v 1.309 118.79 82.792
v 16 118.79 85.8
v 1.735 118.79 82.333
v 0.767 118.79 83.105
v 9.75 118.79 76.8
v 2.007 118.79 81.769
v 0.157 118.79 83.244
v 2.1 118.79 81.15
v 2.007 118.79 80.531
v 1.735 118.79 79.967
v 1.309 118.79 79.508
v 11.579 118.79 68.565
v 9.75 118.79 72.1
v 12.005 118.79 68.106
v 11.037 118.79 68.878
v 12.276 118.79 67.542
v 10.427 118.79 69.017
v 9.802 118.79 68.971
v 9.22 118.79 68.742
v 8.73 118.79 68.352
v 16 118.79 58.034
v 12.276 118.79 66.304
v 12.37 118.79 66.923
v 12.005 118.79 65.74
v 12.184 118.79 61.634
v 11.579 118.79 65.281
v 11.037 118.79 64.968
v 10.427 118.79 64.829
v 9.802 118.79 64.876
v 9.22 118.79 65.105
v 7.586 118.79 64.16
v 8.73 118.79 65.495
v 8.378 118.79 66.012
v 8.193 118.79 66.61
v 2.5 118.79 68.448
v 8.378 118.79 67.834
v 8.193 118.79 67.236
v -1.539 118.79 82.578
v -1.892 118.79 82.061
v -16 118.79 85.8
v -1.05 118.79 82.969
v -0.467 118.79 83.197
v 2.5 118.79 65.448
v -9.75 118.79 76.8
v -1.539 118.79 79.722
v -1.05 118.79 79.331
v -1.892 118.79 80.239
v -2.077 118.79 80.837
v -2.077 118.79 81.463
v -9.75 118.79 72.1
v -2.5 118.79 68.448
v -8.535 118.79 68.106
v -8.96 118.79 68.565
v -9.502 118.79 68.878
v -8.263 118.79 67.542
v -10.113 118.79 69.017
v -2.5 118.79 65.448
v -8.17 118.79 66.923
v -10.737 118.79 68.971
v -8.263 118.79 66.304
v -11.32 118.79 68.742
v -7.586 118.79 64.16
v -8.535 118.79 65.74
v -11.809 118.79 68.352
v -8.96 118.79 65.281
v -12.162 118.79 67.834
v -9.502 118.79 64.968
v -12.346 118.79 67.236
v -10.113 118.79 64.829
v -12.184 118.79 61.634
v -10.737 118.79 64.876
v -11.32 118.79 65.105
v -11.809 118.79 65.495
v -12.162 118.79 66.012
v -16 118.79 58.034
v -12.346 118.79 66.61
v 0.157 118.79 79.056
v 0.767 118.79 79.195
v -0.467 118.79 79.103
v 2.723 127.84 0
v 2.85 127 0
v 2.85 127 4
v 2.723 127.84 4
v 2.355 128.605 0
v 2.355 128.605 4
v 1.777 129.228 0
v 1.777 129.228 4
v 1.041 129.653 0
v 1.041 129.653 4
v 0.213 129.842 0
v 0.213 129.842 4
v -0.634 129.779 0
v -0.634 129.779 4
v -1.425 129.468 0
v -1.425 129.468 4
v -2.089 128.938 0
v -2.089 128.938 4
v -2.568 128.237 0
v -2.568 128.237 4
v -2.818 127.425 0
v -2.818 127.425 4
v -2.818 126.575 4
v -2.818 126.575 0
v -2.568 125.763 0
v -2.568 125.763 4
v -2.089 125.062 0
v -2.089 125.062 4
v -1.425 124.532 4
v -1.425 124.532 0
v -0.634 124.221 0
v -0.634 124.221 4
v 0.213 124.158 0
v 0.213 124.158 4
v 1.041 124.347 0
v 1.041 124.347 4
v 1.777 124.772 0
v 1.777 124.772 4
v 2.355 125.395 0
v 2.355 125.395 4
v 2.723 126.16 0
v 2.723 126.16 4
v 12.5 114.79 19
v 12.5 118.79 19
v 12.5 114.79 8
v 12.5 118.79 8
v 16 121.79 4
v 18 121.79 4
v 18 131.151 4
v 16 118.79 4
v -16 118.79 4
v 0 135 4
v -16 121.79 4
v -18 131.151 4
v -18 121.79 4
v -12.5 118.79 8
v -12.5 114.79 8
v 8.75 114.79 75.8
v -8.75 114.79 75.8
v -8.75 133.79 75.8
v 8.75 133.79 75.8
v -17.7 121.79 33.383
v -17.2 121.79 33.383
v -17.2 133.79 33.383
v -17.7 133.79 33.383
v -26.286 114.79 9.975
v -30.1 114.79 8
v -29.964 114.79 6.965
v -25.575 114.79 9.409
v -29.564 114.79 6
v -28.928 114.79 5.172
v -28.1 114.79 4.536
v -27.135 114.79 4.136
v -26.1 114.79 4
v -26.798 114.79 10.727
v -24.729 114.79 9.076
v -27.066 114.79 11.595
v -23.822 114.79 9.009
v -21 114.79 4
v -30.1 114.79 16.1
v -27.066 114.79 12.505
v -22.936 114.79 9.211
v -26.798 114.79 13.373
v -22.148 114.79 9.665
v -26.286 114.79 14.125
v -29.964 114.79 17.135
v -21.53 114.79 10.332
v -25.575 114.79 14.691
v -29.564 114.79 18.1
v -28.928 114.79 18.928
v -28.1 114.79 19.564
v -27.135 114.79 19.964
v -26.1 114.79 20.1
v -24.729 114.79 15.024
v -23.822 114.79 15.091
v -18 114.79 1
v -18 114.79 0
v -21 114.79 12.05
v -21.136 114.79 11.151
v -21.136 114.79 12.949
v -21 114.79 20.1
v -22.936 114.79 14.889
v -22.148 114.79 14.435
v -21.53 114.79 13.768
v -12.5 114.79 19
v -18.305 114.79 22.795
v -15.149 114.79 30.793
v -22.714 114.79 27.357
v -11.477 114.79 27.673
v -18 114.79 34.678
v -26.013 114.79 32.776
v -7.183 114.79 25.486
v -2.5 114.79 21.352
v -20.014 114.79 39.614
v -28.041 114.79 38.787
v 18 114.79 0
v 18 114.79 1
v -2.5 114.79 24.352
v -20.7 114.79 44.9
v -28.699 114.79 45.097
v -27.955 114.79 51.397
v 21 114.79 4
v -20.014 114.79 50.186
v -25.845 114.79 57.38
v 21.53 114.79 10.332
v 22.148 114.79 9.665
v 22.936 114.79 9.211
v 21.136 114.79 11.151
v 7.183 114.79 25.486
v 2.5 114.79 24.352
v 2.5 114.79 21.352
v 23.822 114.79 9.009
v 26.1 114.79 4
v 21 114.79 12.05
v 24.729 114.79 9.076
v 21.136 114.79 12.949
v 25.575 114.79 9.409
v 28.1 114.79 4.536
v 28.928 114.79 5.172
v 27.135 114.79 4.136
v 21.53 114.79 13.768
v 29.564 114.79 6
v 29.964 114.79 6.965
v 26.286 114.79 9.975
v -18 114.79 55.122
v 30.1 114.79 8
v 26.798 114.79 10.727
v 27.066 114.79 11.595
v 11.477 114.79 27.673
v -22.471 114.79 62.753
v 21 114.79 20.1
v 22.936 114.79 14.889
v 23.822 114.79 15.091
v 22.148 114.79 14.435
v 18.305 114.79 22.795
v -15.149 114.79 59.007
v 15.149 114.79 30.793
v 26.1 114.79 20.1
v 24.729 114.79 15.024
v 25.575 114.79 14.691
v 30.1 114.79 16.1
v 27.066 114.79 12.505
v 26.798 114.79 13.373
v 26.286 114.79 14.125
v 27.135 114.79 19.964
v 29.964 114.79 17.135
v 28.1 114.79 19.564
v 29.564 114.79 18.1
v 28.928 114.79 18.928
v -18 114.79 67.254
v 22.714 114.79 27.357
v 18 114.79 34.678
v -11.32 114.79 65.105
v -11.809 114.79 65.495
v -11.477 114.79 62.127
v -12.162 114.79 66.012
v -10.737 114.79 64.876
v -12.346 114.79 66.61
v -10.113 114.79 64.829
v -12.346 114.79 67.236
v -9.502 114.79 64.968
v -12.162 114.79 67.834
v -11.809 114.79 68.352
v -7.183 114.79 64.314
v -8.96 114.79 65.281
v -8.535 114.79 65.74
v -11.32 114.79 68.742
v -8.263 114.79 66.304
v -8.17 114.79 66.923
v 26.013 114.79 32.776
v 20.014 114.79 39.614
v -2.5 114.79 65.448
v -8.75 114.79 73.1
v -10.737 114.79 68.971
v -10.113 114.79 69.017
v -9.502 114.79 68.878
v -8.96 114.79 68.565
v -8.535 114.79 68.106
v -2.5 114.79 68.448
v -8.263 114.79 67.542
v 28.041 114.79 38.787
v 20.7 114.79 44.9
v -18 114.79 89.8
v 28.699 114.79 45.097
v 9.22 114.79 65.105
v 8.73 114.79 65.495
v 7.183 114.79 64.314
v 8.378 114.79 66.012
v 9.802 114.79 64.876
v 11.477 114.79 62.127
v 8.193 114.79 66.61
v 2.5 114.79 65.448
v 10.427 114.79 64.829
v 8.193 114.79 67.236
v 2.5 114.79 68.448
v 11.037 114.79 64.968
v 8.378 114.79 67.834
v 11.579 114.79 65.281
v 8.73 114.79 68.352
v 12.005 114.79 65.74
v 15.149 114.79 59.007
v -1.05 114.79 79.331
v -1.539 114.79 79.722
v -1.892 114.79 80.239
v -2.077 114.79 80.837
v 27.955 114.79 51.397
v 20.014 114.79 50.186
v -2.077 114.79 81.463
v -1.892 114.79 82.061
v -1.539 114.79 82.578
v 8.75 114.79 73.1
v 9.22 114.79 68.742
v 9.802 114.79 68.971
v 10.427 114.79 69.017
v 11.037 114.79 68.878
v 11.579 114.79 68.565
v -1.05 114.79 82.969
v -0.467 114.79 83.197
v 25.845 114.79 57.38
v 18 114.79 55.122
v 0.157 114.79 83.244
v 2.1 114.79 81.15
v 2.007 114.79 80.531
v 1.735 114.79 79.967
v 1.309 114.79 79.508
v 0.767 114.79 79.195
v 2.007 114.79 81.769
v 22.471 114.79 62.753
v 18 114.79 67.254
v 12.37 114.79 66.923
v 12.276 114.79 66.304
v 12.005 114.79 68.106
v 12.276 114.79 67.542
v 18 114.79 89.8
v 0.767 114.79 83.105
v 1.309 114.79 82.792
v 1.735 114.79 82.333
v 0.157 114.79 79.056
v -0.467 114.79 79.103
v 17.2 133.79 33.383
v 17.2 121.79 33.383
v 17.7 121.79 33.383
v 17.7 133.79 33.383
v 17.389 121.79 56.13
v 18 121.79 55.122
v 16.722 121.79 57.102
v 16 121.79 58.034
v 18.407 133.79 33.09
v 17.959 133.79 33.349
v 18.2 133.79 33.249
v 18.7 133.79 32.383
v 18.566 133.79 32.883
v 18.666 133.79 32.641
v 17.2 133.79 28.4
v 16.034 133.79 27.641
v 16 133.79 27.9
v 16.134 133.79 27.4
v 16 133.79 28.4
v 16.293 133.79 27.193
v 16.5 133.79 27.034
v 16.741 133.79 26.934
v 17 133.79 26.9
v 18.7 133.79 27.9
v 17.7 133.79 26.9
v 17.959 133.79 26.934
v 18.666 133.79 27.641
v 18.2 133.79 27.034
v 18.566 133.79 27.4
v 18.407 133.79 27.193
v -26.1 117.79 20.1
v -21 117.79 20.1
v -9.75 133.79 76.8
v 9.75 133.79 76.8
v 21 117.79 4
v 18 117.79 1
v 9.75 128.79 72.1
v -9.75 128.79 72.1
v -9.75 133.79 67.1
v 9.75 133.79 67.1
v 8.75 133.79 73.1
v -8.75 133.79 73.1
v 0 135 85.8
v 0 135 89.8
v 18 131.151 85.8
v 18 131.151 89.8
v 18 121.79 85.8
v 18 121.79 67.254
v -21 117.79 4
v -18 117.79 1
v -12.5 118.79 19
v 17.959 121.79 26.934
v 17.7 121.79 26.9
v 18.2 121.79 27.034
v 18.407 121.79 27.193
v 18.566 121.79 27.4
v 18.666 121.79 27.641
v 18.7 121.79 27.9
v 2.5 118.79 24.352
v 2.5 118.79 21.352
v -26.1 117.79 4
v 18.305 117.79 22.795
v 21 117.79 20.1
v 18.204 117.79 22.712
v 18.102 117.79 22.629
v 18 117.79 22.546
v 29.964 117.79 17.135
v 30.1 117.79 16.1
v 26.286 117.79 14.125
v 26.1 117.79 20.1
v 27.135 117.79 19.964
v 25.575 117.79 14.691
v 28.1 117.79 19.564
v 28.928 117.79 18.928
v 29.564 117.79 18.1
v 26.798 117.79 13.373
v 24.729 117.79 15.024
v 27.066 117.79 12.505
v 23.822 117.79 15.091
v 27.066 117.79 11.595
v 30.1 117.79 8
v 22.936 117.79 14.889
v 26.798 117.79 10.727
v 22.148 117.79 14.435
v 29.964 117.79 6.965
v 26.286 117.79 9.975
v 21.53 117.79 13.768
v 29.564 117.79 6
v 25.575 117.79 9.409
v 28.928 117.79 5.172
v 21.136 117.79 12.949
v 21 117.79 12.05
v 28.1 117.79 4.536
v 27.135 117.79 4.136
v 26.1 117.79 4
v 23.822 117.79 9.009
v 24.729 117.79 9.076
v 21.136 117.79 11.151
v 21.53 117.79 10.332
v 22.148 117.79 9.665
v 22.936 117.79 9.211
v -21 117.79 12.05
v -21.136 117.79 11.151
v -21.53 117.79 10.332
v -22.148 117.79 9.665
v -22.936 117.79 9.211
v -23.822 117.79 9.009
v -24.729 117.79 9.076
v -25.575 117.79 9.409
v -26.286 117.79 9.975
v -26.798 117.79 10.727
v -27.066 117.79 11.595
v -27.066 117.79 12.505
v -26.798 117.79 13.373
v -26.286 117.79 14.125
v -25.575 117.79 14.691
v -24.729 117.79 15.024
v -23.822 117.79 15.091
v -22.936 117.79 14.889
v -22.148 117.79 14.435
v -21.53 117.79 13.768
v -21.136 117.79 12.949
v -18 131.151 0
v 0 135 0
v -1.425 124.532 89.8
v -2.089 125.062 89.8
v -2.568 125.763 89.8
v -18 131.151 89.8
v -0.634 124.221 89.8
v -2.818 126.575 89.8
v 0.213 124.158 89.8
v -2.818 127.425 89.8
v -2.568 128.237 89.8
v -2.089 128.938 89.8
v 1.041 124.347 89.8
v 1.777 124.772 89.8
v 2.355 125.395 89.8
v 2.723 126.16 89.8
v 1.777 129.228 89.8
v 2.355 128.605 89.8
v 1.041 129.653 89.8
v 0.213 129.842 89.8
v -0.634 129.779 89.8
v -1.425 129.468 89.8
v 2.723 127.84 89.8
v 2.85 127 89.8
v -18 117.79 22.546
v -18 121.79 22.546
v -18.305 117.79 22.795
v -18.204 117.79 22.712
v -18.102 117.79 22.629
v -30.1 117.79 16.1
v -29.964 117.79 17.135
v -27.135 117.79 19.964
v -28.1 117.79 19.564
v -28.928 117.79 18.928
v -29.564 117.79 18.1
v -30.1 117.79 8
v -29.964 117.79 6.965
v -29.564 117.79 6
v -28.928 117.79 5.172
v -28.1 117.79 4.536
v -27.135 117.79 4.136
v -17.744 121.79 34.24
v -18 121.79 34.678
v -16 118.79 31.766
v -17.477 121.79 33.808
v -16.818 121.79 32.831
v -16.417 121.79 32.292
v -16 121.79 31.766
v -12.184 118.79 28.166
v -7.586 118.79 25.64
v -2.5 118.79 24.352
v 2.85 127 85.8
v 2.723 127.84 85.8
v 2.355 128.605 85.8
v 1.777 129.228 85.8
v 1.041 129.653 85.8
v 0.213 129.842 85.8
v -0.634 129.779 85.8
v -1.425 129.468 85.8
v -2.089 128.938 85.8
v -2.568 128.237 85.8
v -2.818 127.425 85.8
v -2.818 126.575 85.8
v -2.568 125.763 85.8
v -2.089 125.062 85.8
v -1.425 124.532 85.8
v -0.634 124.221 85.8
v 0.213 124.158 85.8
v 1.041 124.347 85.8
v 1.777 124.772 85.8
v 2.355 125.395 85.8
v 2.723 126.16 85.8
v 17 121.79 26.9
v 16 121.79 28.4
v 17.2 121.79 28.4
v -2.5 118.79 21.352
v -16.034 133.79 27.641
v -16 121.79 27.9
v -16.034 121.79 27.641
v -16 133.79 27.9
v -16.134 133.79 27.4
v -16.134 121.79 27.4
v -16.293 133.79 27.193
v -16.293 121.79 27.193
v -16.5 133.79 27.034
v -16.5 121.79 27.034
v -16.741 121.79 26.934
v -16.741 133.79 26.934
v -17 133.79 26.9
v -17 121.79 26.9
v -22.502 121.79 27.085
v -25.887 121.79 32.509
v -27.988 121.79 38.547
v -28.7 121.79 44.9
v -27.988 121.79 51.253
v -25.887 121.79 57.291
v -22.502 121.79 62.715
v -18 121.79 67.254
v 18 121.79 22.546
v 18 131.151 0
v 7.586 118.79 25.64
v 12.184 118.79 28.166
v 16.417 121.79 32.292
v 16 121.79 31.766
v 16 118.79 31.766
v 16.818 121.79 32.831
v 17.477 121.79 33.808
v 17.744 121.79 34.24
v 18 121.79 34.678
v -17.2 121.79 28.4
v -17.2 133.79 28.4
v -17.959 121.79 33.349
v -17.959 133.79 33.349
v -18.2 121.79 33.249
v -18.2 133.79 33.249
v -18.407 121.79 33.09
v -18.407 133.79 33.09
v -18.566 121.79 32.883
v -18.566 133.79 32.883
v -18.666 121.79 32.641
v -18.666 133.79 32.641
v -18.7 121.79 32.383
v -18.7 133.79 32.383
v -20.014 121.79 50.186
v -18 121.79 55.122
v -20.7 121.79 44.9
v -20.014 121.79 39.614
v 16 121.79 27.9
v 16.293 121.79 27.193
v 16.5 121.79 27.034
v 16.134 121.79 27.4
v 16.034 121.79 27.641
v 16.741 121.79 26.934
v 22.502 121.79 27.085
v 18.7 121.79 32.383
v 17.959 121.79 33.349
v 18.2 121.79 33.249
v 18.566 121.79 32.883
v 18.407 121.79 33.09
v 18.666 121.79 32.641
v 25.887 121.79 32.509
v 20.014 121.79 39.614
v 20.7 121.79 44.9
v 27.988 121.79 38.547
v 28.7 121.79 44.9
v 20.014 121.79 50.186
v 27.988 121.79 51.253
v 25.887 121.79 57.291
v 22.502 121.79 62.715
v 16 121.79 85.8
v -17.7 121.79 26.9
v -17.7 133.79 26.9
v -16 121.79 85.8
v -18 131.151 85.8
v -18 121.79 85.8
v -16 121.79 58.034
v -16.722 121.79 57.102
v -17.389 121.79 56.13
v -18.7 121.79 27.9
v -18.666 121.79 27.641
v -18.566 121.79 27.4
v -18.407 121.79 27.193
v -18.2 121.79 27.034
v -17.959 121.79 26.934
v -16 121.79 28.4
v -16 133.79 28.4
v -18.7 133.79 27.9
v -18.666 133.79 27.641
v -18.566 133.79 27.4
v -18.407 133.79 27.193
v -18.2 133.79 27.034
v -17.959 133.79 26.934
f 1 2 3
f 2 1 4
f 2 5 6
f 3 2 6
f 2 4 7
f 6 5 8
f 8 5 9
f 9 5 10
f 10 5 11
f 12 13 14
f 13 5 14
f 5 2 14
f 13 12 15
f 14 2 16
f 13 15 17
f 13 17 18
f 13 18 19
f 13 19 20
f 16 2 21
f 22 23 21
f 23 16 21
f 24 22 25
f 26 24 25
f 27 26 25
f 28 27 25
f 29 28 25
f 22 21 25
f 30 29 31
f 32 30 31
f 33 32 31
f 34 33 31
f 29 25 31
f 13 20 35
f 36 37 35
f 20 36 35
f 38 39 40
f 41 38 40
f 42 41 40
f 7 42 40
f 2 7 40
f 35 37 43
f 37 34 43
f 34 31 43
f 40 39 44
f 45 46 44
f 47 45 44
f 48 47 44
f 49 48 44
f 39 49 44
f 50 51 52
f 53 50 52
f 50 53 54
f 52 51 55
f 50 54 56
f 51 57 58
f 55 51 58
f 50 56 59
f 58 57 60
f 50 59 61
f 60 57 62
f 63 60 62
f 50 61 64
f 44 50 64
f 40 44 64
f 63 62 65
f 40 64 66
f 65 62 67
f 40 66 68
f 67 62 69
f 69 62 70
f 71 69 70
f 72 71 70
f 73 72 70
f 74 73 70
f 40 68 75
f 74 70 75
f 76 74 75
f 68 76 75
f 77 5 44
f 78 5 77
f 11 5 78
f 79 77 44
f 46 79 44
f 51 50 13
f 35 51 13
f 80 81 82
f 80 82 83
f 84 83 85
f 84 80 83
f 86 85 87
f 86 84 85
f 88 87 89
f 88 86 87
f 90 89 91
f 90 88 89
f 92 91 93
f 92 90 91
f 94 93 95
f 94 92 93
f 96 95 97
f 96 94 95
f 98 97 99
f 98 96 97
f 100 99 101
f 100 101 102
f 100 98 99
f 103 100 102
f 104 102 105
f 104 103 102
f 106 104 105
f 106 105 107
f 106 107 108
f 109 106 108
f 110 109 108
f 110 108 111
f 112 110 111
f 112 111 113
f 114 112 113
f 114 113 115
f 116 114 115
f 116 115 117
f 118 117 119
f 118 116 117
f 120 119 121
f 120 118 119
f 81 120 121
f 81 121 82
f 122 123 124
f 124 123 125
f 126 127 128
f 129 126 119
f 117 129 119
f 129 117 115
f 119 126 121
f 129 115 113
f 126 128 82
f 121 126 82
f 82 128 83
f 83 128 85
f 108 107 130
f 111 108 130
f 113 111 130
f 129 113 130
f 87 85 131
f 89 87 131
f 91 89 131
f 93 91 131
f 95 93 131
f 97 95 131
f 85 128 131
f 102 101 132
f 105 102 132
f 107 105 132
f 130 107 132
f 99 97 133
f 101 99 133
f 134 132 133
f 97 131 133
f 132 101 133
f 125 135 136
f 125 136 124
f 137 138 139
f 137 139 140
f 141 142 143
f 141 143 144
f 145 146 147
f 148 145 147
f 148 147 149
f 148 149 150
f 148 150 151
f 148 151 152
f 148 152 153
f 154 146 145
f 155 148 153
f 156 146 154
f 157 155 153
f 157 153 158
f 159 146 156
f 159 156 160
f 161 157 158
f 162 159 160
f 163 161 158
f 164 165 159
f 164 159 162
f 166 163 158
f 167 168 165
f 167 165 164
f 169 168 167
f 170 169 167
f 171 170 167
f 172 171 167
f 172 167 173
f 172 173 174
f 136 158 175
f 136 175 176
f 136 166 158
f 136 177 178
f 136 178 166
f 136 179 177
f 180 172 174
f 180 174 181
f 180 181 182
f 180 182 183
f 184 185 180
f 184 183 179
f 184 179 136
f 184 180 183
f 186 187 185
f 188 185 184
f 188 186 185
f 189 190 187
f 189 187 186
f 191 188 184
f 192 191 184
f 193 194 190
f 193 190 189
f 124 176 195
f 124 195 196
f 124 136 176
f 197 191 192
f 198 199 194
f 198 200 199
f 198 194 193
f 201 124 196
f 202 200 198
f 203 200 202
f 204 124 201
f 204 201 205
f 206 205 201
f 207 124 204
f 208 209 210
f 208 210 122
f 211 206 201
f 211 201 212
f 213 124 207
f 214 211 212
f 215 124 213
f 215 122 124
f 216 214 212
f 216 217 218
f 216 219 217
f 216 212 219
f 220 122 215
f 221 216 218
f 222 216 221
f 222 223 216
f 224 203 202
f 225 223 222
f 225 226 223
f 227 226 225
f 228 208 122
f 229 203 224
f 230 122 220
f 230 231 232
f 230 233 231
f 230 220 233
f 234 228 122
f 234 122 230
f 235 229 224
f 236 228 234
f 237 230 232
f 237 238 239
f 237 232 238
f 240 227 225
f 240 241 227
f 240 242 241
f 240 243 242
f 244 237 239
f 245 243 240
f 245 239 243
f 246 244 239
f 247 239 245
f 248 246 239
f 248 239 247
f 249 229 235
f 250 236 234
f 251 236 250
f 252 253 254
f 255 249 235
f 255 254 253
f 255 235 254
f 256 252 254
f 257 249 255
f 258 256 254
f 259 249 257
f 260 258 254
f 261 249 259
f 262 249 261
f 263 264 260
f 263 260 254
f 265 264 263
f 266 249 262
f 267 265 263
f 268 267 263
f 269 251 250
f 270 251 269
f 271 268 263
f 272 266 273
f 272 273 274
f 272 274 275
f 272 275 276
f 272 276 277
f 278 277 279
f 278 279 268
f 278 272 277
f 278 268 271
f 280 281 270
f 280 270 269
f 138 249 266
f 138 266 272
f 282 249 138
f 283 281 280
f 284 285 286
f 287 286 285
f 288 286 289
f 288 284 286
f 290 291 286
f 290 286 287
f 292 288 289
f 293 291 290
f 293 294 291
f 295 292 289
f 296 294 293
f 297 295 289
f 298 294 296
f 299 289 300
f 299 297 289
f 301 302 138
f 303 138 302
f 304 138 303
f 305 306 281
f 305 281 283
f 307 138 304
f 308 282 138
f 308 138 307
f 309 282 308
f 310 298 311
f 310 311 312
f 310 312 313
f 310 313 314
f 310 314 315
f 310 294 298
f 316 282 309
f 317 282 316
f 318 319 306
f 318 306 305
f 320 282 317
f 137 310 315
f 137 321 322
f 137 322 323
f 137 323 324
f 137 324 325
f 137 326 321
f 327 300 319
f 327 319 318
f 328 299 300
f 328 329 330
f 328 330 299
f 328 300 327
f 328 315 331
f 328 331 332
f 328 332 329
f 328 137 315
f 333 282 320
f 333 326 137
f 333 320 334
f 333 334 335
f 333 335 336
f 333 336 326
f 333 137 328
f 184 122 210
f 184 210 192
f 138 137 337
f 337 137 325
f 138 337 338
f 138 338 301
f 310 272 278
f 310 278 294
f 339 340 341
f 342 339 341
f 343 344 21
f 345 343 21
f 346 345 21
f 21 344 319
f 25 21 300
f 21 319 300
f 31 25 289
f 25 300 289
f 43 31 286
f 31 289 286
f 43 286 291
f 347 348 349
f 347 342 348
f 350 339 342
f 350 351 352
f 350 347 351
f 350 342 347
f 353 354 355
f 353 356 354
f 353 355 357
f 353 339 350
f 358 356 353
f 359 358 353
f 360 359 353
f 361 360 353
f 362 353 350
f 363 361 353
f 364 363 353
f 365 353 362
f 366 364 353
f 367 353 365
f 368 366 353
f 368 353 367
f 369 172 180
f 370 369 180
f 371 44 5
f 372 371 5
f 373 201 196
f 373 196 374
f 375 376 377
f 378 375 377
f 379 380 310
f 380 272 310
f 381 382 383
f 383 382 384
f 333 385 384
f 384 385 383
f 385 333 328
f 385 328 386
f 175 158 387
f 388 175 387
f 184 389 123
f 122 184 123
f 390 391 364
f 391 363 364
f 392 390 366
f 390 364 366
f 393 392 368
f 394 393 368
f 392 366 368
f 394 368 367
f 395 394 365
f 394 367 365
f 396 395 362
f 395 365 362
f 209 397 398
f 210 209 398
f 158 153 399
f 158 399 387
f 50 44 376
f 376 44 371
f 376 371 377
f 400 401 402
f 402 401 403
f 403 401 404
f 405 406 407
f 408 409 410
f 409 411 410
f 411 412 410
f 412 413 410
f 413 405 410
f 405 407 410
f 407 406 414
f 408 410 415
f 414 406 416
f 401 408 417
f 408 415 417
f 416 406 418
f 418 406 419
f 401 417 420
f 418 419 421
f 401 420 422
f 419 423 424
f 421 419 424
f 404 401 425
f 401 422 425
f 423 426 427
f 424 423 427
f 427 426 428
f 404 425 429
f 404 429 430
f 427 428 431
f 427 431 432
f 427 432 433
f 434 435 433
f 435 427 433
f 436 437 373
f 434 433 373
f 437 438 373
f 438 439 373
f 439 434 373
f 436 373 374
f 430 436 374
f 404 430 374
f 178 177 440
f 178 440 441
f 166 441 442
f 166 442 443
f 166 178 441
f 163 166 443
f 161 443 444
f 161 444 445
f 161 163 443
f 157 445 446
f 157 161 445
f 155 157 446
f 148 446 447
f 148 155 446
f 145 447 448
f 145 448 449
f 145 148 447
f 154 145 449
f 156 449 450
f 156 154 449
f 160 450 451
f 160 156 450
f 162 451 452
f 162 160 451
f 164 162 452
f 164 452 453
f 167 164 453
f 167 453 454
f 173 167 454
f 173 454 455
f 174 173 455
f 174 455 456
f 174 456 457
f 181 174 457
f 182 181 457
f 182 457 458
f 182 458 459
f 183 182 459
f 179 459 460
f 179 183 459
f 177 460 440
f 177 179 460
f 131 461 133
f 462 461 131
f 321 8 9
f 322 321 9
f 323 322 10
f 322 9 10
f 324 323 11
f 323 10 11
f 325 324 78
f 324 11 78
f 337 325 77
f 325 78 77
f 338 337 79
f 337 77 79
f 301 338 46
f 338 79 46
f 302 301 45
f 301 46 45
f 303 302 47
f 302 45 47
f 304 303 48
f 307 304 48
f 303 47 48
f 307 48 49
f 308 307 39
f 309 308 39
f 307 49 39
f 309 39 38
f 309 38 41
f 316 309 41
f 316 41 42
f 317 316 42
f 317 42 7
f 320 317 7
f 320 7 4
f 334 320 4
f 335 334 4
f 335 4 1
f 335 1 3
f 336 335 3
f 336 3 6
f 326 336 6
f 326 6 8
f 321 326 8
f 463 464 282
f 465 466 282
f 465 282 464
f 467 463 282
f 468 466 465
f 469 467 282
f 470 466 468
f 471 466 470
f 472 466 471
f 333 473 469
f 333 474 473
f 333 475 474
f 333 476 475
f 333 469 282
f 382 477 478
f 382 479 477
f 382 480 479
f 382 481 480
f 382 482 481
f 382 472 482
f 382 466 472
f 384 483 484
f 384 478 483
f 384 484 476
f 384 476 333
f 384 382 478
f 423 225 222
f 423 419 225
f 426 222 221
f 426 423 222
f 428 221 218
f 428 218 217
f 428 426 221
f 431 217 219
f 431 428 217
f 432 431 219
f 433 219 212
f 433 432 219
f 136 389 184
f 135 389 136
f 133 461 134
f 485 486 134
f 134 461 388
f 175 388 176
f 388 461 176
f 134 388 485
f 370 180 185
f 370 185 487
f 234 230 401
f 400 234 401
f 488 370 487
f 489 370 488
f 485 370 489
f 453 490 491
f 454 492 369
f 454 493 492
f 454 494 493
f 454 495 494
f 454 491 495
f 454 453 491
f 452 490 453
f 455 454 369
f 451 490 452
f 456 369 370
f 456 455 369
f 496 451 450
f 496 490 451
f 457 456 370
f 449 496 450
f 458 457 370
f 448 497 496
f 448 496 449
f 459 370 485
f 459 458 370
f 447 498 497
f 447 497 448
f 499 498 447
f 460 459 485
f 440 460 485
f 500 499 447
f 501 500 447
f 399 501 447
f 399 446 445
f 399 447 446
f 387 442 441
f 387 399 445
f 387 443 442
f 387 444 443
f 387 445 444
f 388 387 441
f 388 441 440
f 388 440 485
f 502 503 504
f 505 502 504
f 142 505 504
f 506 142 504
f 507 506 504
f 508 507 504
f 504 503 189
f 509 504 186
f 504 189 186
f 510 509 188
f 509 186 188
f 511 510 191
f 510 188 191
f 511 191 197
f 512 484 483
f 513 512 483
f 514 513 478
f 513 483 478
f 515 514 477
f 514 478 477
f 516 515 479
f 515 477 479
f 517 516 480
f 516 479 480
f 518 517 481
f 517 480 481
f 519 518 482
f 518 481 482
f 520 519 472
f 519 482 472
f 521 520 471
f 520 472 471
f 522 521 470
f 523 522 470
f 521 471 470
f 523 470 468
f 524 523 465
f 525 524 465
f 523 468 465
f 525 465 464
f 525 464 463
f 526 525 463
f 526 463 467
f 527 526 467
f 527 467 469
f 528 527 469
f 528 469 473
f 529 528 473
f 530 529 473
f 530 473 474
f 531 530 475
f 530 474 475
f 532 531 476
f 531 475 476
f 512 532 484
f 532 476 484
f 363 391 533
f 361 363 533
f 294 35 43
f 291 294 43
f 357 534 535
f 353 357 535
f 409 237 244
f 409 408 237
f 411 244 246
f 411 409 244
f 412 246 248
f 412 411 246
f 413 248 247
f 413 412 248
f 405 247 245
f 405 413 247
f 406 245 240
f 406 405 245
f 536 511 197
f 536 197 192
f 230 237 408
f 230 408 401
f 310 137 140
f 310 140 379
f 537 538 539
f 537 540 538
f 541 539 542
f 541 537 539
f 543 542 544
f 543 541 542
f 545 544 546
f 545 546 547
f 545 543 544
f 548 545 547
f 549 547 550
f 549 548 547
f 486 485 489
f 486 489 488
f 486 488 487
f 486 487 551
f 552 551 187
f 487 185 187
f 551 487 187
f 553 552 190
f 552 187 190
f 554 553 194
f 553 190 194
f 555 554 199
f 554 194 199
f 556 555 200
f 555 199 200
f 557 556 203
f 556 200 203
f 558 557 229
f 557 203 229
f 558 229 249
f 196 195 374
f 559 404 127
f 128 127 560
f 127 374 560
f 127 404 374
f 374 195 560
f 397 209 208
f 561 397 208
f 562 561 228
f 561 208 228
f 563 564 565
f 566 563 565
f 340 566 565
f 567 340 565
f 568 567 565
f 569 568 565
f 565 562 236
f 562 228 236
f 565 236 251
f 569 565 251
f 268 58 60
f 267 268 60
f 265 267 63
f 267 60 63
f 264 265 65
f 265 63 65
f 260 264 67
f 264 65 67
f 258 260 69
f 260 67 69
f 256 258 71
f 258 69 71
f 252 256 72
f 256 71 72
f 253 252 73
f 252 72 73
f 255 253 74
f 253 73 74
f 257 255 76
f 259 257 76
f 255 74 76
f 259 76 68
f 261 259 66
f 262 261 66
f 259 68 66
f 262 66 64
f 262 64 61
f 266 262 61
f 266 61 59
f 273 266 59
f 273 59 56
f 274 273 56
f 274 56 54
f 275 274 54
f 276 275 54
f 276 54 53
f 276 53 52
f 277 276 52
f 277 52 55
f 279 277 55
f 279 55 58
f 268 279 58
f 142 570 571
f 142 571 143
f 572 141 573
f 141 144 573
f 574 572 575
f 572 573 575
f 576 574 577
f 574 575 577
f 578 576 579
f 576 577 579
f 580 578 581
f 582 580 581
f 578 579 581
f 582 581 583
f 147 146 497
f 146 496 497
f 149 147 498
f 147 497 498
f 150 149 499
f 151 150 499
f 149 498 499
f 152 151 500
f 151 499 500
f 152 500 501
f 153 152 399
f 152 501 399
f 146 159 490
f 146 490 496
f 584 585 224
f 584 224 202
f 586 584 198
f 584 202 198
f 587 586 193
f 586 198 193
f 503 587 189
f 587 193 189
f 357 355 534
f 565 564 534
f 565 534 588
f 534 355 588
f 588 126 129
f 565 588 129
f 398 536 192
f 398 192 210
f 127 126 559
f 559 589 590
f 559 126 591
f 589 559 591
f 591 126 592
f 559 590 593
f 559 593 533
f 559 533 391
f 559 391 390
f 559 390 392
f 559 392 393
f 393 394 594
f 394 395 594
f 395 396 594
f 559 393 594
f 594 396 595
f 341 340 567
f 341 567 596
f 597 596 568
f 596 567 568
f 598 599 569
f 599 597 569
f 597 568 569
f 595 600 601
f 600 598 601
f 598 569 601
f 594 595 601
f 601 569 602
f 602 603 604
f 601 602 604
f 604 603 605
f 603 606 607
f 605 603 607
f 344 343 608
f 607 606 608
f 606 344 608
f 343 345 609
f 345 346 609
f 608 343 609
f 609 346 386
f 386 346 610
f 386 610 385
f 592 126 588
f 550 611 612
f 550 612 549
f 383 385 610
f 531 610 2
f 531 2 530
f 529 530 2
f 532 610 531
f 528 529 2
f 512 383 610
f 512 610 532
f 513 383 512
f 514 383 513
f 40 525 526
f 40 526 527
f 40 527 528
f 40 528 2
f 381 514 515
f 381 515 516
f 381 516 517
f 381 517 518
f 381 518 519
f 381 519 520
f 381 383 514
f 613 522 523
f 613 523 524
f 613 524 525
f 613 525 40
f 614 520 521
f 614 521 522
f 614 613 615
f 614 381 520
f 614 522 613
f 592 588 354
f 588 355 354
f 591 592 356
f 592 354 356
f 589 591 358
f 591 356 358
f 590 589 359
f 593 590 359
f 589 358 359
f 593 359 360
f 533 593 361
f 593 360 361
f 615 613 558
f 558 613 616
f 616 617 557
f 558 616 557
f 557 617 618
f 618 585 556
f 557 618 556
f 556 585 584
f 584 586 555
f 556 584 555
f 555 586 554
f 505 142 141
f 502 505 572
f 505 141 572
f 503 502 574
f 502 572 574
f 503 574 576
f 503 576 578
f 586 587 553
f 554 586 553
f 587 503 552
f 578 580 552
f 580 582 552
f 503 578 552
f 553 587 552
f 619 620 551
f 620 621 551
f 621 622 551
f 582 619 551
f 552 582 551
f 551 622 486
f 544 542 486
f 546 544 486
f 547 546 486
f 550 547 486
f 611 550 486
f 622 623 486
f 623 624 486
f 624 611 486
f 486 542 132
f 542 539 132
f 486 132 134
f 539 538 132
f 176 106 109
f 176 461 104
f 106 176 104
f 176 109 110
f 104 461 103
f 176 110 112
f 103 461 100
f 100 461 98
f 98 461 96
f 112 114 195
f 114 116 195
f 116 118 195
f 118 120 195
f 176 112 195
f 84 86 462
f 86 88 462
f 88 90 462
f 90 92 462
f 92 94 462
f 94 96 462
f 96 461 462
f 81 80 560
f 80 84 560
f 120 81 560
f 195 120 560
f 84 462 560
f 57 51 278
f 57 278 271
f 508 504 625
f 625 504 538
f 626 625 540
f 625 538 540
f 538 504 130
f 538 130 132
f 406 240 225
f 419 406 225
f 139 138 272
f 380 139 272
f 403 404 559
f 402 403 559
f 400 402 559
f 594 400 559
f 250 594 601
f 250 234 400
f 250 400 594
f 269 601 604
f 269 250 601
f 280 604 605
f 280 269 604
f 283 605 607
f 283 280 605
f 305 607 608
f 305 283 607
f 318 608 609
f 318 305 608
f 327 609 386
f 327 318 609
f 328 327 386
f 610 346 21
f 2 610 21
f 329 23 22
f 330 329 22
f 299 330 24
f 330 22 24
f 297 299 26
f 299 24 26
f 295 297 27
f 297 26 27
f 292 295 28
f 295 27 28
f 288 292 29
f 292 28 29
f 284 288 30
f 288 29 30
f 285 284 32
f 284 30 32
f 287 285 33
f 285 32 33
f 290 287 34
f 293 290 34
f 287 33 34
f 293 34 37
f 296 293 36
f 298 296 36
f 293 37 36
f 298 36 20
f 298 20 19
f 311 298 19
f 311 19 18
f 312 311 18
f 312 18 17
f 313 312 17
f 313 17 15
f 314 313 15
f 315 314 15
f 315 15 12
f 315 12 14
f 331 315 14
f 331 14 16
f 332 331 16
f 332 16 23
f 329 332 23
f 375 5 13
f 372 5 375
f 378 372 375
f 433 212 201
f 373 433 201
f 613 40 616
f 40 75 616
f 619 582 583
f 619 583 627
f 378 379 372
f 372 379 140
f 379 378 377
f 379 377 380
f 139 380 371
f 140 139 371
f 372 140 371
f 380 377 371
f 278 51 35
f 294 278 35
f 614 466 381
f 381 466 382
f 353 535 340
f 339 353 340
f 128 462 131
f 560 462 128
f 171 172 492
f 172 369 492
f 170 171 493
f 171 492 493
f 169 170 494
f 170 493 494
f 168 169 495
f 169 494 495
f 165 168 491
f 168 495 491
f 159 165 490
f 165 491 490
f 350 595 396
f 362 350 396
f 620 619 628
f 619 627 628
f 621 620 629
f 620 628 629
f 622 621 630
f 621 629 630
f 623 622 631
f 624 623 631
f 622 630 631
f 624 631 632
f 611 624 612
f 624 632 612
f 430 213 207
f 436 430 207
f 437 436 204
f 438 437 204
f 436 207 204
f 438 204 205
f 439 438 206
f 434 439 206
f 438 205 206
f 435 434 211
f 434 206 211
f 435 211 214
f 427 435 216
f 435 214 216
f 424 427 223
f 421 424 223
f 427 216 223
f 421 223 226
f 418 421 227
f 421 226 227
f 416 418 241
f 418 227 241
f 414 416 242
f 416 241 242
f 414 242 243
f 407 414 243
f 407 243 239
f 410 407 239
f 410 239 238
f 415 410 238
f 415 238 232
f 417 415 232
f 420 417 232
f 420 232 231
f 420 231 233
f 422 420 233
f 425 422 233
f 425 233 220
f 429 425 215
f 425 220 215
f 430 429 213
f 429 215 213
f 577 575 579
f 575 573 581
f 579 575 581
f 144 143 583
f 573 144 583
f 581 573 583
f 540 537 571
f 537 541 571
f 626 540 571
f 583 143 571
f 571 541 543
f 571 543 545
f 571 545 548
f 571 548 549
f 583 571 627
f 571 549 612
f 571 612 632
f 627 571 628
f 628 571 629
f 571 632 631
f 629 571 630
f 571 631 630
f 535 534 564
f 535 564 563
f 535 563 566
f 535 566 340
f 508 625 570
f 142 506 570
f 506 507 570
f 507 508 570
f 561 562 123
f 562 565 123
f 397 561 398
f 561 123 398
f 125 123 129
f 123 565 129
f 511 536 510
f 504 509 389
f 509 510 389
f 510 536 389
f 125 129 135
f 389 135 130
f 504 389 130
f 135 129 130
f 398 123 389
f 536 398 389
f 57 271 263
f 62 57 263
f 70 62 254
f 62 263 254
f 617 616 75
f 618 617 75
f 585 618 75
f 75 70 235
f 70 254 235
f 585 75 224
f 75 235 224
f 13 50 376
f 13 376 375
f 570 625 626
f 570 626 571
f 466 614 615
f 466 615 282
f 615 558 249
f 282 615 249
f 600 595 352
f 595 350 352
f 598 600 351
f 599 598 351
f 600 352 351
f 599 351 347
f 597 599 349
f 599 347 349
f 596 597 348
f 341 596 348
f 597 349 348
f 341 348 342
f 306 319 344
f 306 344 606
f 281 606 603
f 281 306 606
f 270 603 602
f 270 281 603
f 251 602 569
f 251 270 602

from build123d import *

# Parameters (mm, degrees)
BOSS_EXTRUDE1_DEPTH  = 89.8
SKETCH5_R            = 2.85
BOSS_EXTRUDE2_DEPTH  = 4
SKETCH6_W            = 25
SKETCH6_H            = 11
CUT_EXTRUDE4_DEPTH   = 5
SKETCH8_W            = 19.5
SKETCH8_H            = 4.7
SKETCH8_W_2          = 17.5
SKETCH8_H_2          = 2.7
BOSS_EXTRUDE3_DEPTH  = 15
BOSS_EXTRUDE4_DEPTH  = 19.5
SKETCH13_W           = 17.5
SKETCH13_H           = 2.7
CUT_EXTRUDE5_DEPTH   = 5
SKETCH14_W           = 12.1
SKETCH14_H           = 16.1
SKETCH14_R           = 3.05
BOSS_EXTRUDE7_DEPTH  = 3
CHAMFER1_SIZE        = 3
SKETCH17_R           = 2.1
CUT_EXTRUDE6_DEPTH   = 5
BOSS_EXTRUDE8_DEPTH  = 7
CUT_EXTRUDE7_REACH   = 22.21
SKETCH20_R           = 20.7
FILLET1_R            = 4
SKETCH21_R           = 2.1
CUT_EXTRUDE8_DEPTH   = 5
SKETCH22_W           = 5
SKETCH22_H           = 3
CUT_EXTRUDE9_DEPTH   = 5
BOSS_EXTRUDE9_DEPTH  = 12
FILLET2_R            = 1
FILLET2_OF_MIRROR3_R = 1


with BuildPart() as part:
    # Sketch1 → Boss-Extrude1 (new body)
    with BuildSketch(Plane.XY):
        Polygon((-18, 114.78957189), (0, 114.78957189), (18, 114.78957189), (18, 121.78957189), (16, 121.78957189), (16, 118.78957189), (-16, 118.78957189), (-16, 121.78957189), (-18, 121.78957189), align=None)
    extrude(amount=BOSS_EXTRUDE1_DEPTH)

    # Sketch5 → Boss-Extrude2 (add)
    with BuildSketch(Plane.XY):
        Polygon((-18, 114.78957189), (-18, 131.151236874), (0, 135), (18, 131.151236874), (18, 114.78957189), align=None)
        with Locations((0, 127)):
            Circle(SKETCH5_R, mode=Mode.SUBTRACT)
    boss_extrude2 = extrude(amount=BOSS_EXTRUDE2_DEPTH)

    # Mirror1: Boss-Extrude2 across plane
    add(boss_extrude2.mirror(Plane(origin=(0, 0, 44.9), x_dir=(1, 0, 0), z_dir=(0, 0, -1))))

    # Sketch6 → Cut-Extrude4 (cut, through all)
    with BuildSketch(Plane(origin=(0, 118.78957189, 0), x_dir=(1, 0, 0), z_dir=(0, 1, 0))):
        with Locations((0, -13.5)):
            Rectangle(SKETCH6_W, SKETCH6_H)
    extrude(amount=-CUT_EXTRUDE4_DEPTH, mode=Mode.SUBTRACT)

    # Sketch8 → Boss-Extrude3 (add)
    with BuildSketch(Plane(origin=(0, 118.78957189, 0), x_dir=(1, 0, 0), z_dir=(0, 1, 0))):
        with Locations((0, -74.45)):
            Rectangle(SKETCH8_W, SKETCH8_H)
        with Locations((0, -74.45)):
            Rectangle(SKETCH8_W_2, SKETCH8_H_2, mode=Mode.SUBTRACT)
    extrude(amount=BOSS_EXTRUDE3_DEPTH)

    # Sketch9 → Boss-Extrude4 (add)
    with BuildSketch(Plane.ZY.offset(9.75)):
        Polygon((72.1, 128.78957189), (67.1, 133.78957189), (72.1, 133.78957189), align=None)
    extrude(amount=-BOSS_EXTRUDE4_DEPTH)

    # Sketch13 → Cut-Extrude5 (cut, through all)
    with BuildSketch(Plane(origin=(0, 118.78957189, 0), x_dir=(1, 0, 0), z_dir=(0, 1, 0))):
        with Locations((0, -74.45)):
            Rectangle(SKETCH13_W, SKETCH13_H)
    extrude(amount=-CUT_EXTRUDE5_DEPTH, mode=Mode.SUBTRACT)

    # Sketch14 → Boss-Extrude7 (add)
    with BuildSketch(Plane(origin=(0, 114.78957189, 0), x_dir=(1, 0, 0), z_dir=(0, 1, 0))):
        with Locations((-24.05, -12.05)):
            Rectangle(SKETCH14_W, SKETCH14_H)
        with Locations((-24.05, -12.05)):
            Circle(SKETCH14_R, mode=Mode.SUBTRACT)
    boss_extrude7 = extrude(amount=BOSS_EXTRUDE7_DEPTH)

    # Mirror2: Boss-Extrude7 across plane
    add(boss_extrude7.mirror(Plane(origin=(0, 0, 0), x_dir=(0, 0, 1), z_dir=(1, 0, 0))))

    # Chamfer1
    chamfer1_edges = [part.edges().sort_by_distance(p)[0] for p in [
        (-18, 116.28957189, 20.1),
        (-18, 116.28957189, 4),
        (18, 116.28957189, 4),
        (18, 116.28957189, 20.1),
    ]]
    chamfer(chamfer1_edges, length=CHAMFER1_SIZE)

    # Sketch17 → Cut-Extrude6 (cut, through all)
    with BuildSketch(Plane(origin=(0, 118.78957189, 0), x_dir=(1, 0, 0), z_dir=(0, 1, 0))):
        with Locations((0, -81.15)):
            Circle(SKETCH17_R)
    extrude(amount=-CUT_EXTRUDE6_DEPTH, mode=Mode.SUBTRACT)

    # Sketch19 → Boss-Extrude8 (add)
    with BuildSketch(Plane.XZ.offset(-114.78957189)):
        with BuildLine():
            Line((18, 67.25374689), (18, 55.122035022))
            ThreePointArc((18, 55.122035022), (20.7, 44.9), (18, 34.677964978))
            Line((18, 34.677964978), (18, 22.54625311))
            ThreePointArc((18, 22.54625311), (28.7, 44.9), (18, 67.25374689))
        make_face()
        with BuildLine():
            Line((-16, 68.726246032), (-16, 58.033544838))
            ThreePointArc((-16, 58.033544838), (-20.624518846, 46.666132031), (-18, 34.677964978))
            Line((-18, 34.677964978), (-18, 22.54625311))
            ThreePointArc((-18, 22.54625311), (-28.673122198, 46.141798467), (-16, 68.726246032))
        make_face()
    extrude(amount=-BOSS_EXTRUDE8_DEPTH)

    # Sketch20 → Cut-Extrude7 (cut, up to next)
    with BuildSketch(Plane.XZ.offset(-114.78957189), mode=Mode.PRIVATE) as cut_extrude7_sk1:
        with Locations((0, 44.9)):
            Circle(SKETCH20_R)
    cut_extrude7_tool1 = extrude(cut_extrude7_sk1.sketch, amount=-CUT_EXTRUDE7_REACH, mode=Mode.PRIVATE) & part.part
    add(cut_extrude7_tool1.solids().sort_by_distance((0, 114.789572, 44.9))[0], mode=Mode.SUBTRACT)

    # Fillet1
    fillet1_edges = [part.edges().sort_by_distance(p)[0] for p in [
        (-30.1, 116.28957189, 4),
        (-30.1, 116.28957189, 20.1),
        (30.1, 116.28957189, 20.1),
        (30.1, 116.28957189, 4),
    ]]
    fillet(fillet1_edges, radius=FILLET1_R)

    # Sketch21 → Cut-Extrude8 (cut, through all)
    with BuildSketch(Plane(origin=(0, 118.78957189, 0), x_dir=(1, 0, 0), z_dir=(0, 1, 0))):
        with Locations((-10.26962376, -66.923279225)):
            Circle(SKETCH21_R)
        with Locations((10.26962376, -66.923279225)):
            Circle(SKETCH21_R)
    extrude(amount=-CUT_EXTRUDE8_DEPTH, mode=Mode.SUBTRACT)

    # Sketch22 → Cut-Extrude9 (cut, through all)
    with BuildSketch(Plane(origin=(0, 118.78957189, 0), x_dir=(1, 0, 0), z_dir=(0, 1, 0))):
        with Locations((0, -66.948479262)):
            Rectangle(SKETCH22_W, SKETCH22_H)
        with Locations((0, -22.851520738)):
            Rectangle(SKETCH22_W, SKETCH22_H)
    extrude(amount=-CUT_EXTRUDE9_DEPTH, mode=Mode.SUBTRACT)

    # Sketch23 → Boss-Extrude9 (add)
    with BuildSketch(Plane(origin=(0, 121.78957189, 0), x_dir=(1, 0, 0), z_dir=(0, 1, 0))):
        Polygon((-18.7, -26.9), (-16, -26.9), (-16, -28.4), (-17.2, -28.4), (-17.2, -33.382621826), (-18.7, -33.382621826), align=None)
    boss_extrude9 = extrude(amount=BOSS_EXTRUDE9_DEPTH)

    # Fillet2
    fillet2_edges = [part.edges().sort_by_distance(p)[0] for p in [
        (-16, 127.78957189, 26.9),
        (-18.7, 127.78957189, 33.382621826),
        (-18.7, 127.78957189, 26.9),
    ]]
    fillet(fillet2_edges, radius=FILLET2_R)

    # Mirror3: Boss-Extrude9 across plane
    add(boss_extrude9.mirror(Plane(origin=(0, 0, 0), x_dir=(0, 0, 1), z_dir=(1, 0, 0))))

    # Fillet2 of Mirror3
    fillet2_of_mirror3_edges = [part.edges().sort_by_distance(p)[0] for p in [
        (16, 127.78957189, 26.9),
        (18.7, 127.78957189, 33.382621826),
        (18.7, 127.78957189, 26.9),
    ]]
    fillet(fillet2_of_mirror3_edges, radius=FILLET2_OF_MIRROR3_R)


solid = part.part
